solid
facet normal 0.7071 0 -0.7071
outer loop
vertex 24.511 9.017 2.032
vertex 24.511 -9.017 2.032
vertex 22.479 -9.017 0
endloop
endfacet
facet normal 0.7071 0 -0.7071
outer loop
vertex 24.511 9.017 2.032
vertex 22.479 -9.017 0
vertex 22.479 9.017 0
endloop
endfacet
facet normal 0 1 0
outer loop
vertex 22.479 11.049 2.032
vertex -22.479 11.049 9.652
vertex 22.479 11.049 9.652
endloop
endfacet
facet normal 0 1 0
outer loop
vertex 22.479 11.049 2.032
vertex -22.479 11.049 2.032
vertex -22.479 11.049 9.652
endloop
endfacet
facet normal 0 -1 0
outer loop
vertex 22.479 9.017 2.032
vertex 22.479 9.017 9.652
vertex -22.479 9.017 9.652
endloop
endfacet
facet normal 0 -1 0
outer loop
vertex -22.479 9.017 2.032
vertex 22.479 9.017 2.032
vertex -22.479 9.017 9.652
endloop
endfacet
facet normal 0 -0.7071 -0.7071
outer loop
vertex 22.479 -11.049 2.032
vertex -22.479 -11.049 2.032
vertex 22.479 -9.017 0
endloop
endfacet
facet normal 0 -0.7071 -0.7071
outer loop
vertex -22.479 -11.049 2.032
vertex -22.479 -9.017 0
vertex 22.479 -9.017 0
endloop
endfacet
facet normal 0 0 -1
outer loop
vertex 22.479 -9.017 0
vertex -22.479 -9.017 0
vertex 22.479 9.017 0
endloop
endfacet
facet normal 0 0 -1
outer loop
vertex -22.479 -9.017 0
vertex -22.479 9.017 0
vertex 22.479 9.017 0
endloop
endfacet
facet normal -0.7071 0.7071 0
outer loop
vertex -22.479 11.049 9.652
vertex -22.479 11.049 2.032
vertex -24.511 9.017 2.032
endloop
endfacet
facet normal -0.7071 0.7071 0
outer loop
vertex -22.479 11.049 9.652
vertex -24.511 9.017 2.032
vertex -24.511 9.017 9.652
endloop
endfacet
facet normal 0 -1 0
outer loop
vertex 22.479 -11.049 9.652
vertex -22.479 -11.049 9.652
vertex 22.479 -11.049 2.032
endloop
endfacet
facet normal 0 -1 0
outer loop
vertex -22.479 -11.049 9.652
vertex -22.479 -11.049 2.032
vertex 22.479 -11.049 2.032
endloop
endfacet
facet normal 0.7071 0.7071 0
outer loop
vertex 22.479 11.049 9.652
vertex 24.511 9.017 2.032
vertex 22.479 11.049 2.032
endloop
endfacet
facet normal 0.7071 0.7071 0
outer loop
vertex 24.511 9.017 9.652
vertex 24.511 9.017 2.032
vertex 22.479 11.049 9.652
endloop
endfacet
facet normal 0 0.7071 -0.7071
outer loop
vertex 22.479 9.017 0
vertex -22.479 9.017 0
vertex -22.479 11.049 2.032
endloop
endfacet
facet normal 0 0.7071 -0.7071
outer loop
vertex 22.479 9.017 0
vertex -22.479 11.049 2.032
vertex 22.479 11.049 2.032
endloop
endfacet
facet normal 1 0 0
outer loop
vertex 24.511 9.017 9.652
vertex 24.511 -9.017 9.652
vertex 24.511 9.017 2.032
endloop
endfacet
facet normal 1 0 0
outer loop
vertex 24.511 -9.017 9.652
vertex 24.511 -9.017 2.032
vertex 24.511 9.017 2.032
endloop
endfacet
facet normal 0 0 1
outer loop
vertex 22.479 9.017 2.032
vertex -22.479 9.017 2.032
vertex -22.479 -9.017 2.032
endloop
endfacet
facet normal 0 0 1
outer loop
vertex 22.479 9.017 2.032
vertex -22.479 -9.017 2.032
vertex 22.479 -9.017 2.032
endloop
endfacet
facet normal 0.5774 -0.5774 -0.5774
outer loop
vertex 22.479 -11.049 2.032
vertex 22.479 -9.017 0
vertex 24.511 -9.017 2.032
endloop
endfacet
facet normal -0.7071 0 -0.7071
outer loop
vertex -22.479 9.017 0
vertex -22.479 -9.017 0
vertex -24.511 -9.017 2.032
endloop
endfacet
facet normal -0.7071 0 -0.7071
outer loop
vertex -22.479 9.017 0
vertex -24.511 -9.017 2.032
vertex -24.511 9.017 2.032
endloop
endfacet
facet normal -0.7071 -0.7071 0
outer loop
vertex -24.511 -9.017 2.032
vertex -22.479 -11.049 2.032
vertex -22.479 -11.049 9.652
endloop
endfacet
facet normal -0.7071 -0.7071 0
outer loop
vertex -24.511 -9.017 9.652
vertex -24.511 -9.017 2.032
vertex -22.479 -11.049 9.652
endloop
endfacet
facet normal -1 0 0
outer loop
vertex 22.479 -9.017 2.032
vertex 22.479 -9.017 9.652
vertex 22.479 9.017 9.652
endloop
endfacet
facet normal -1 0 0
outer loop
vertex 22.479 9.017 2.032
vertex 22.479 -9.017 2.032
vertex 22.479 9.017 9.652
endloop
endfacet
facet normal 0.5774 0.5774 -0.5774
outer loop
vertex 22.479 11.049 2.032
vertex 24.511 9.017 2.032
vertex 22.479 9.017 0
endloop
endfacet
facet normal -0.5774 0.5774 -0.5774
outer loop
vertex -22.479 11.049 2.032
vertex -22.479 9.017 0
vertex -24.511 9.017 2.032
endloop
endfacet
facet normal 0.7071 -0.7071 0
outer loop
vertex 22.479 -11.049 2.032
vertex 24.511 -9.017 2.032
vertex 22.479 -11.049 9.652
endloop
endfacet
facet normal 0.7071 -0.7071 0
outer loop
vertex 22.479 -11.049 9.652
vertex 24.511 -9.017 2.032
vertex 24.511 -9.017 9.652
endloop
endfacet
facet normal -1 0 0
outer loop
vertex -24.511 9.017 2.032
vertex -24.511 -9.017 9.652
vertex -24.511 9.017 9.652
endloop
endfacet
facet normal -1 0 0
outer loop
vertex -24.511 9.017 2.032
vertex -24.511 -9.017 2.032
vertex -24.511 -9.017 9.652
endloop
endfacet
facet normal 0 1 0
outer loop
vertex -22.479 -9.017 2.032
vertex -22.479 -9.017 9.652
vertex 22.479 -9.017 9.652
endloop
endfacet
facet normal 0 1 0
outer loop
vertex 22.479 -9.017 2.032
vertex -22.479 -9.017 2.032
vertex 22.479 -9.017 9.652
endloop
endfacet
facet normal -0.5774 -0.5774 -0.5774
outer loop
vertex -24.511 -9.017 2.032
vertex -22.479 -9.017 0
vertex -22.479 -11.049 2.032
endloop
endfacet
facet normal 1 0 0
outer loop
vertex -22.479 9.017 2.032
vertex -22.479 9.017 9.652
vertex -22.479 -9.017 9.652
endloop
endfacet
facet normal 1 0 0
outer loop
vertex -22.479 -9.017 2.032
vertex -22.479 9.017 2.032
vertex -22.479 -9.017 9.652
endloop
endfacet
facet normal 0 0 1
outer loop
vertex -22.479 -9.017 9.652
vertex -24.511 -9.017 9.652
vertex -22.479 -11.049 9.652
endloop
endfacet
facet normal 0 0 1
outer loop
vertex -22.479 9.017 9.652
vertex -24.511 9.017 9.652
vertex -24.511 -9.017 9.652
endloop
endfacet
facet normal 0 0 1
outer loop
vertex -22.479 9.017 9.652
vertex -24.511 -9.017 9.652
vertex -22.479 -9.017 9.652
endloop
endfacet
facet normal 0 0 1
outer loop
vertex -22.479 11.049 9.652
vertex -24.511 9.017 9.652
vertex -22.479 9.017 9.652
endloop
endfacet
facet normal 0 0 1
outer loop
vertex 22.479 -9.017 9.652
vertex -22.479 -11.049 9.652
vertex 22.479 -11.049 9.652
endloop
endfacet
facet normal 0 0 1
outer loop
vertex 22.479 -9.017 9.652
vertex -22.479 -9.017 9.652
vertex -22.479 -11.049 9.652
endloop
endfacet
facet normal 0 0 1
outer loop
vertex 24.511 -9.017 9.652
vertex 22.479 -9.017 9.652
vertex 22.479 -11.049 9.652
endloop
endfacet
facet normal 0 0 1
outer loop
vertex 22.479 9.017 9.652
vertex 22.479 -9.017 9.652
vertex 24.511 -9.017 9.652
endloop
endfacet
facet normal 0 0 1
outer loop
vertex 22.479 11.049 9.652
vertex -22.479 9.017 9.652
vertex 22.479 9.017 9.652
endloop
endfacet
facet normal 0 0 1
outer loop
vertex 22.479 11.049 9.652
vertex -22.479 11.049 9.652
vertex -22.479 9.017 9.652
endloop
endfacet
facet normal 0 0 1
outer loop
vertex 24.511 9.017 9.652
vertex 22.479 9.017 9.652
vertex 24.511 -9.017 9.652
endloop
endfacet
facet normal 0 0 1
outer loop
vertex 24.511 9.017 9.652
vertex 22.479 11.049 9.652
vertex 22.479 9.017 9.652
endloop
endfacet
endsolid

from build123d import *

# Parameters (mm, degrees)
F0_W     = 49.022
F0_H     = 22.098
F1_DEPTH = 9.652
F3_DEPTH = 7.62
F4_SIZE  = 2.032


with BuildPart() as f1:
    # F0 (on Top) → F1 (new body)
    with BuildSketch(Plane.XY):
        Rectangle(F0_W, F0_H)
    extrude(amount=F1_DEPTH)

    # F2 (on face) → F3 (cut)
    with BuildSketch(Plane.XY.offset(9.652)):
        Polygon((22.479, 9.017), (-22.479, 9.017), (-22.479, 4.28625), (-22.479, -4.28625), (-22.479, -9.017), (22.479, -9.017), align=None)
    extrude(amount=-F3_DEPTH, mode=Mode.SUBTRACT)

    # F4
    f4_edges = [f1.edges().sort_by_distance(p)[0] for p in [
        (0, -11.049, 0),
        (24.511, 0, 0),
        (24.511, -11.049, 4.826),
        (24.511, 11.049, 4.826),
        (-24.511, 0, 0),
        (0, 11.049, 0),
        (-24.511, -11.049, 4.826),
        (-24.511, 11.049, 4.826),
    ]]
    chamfer(f4_edges, length=F4_SIZE)


solid = f1.part
